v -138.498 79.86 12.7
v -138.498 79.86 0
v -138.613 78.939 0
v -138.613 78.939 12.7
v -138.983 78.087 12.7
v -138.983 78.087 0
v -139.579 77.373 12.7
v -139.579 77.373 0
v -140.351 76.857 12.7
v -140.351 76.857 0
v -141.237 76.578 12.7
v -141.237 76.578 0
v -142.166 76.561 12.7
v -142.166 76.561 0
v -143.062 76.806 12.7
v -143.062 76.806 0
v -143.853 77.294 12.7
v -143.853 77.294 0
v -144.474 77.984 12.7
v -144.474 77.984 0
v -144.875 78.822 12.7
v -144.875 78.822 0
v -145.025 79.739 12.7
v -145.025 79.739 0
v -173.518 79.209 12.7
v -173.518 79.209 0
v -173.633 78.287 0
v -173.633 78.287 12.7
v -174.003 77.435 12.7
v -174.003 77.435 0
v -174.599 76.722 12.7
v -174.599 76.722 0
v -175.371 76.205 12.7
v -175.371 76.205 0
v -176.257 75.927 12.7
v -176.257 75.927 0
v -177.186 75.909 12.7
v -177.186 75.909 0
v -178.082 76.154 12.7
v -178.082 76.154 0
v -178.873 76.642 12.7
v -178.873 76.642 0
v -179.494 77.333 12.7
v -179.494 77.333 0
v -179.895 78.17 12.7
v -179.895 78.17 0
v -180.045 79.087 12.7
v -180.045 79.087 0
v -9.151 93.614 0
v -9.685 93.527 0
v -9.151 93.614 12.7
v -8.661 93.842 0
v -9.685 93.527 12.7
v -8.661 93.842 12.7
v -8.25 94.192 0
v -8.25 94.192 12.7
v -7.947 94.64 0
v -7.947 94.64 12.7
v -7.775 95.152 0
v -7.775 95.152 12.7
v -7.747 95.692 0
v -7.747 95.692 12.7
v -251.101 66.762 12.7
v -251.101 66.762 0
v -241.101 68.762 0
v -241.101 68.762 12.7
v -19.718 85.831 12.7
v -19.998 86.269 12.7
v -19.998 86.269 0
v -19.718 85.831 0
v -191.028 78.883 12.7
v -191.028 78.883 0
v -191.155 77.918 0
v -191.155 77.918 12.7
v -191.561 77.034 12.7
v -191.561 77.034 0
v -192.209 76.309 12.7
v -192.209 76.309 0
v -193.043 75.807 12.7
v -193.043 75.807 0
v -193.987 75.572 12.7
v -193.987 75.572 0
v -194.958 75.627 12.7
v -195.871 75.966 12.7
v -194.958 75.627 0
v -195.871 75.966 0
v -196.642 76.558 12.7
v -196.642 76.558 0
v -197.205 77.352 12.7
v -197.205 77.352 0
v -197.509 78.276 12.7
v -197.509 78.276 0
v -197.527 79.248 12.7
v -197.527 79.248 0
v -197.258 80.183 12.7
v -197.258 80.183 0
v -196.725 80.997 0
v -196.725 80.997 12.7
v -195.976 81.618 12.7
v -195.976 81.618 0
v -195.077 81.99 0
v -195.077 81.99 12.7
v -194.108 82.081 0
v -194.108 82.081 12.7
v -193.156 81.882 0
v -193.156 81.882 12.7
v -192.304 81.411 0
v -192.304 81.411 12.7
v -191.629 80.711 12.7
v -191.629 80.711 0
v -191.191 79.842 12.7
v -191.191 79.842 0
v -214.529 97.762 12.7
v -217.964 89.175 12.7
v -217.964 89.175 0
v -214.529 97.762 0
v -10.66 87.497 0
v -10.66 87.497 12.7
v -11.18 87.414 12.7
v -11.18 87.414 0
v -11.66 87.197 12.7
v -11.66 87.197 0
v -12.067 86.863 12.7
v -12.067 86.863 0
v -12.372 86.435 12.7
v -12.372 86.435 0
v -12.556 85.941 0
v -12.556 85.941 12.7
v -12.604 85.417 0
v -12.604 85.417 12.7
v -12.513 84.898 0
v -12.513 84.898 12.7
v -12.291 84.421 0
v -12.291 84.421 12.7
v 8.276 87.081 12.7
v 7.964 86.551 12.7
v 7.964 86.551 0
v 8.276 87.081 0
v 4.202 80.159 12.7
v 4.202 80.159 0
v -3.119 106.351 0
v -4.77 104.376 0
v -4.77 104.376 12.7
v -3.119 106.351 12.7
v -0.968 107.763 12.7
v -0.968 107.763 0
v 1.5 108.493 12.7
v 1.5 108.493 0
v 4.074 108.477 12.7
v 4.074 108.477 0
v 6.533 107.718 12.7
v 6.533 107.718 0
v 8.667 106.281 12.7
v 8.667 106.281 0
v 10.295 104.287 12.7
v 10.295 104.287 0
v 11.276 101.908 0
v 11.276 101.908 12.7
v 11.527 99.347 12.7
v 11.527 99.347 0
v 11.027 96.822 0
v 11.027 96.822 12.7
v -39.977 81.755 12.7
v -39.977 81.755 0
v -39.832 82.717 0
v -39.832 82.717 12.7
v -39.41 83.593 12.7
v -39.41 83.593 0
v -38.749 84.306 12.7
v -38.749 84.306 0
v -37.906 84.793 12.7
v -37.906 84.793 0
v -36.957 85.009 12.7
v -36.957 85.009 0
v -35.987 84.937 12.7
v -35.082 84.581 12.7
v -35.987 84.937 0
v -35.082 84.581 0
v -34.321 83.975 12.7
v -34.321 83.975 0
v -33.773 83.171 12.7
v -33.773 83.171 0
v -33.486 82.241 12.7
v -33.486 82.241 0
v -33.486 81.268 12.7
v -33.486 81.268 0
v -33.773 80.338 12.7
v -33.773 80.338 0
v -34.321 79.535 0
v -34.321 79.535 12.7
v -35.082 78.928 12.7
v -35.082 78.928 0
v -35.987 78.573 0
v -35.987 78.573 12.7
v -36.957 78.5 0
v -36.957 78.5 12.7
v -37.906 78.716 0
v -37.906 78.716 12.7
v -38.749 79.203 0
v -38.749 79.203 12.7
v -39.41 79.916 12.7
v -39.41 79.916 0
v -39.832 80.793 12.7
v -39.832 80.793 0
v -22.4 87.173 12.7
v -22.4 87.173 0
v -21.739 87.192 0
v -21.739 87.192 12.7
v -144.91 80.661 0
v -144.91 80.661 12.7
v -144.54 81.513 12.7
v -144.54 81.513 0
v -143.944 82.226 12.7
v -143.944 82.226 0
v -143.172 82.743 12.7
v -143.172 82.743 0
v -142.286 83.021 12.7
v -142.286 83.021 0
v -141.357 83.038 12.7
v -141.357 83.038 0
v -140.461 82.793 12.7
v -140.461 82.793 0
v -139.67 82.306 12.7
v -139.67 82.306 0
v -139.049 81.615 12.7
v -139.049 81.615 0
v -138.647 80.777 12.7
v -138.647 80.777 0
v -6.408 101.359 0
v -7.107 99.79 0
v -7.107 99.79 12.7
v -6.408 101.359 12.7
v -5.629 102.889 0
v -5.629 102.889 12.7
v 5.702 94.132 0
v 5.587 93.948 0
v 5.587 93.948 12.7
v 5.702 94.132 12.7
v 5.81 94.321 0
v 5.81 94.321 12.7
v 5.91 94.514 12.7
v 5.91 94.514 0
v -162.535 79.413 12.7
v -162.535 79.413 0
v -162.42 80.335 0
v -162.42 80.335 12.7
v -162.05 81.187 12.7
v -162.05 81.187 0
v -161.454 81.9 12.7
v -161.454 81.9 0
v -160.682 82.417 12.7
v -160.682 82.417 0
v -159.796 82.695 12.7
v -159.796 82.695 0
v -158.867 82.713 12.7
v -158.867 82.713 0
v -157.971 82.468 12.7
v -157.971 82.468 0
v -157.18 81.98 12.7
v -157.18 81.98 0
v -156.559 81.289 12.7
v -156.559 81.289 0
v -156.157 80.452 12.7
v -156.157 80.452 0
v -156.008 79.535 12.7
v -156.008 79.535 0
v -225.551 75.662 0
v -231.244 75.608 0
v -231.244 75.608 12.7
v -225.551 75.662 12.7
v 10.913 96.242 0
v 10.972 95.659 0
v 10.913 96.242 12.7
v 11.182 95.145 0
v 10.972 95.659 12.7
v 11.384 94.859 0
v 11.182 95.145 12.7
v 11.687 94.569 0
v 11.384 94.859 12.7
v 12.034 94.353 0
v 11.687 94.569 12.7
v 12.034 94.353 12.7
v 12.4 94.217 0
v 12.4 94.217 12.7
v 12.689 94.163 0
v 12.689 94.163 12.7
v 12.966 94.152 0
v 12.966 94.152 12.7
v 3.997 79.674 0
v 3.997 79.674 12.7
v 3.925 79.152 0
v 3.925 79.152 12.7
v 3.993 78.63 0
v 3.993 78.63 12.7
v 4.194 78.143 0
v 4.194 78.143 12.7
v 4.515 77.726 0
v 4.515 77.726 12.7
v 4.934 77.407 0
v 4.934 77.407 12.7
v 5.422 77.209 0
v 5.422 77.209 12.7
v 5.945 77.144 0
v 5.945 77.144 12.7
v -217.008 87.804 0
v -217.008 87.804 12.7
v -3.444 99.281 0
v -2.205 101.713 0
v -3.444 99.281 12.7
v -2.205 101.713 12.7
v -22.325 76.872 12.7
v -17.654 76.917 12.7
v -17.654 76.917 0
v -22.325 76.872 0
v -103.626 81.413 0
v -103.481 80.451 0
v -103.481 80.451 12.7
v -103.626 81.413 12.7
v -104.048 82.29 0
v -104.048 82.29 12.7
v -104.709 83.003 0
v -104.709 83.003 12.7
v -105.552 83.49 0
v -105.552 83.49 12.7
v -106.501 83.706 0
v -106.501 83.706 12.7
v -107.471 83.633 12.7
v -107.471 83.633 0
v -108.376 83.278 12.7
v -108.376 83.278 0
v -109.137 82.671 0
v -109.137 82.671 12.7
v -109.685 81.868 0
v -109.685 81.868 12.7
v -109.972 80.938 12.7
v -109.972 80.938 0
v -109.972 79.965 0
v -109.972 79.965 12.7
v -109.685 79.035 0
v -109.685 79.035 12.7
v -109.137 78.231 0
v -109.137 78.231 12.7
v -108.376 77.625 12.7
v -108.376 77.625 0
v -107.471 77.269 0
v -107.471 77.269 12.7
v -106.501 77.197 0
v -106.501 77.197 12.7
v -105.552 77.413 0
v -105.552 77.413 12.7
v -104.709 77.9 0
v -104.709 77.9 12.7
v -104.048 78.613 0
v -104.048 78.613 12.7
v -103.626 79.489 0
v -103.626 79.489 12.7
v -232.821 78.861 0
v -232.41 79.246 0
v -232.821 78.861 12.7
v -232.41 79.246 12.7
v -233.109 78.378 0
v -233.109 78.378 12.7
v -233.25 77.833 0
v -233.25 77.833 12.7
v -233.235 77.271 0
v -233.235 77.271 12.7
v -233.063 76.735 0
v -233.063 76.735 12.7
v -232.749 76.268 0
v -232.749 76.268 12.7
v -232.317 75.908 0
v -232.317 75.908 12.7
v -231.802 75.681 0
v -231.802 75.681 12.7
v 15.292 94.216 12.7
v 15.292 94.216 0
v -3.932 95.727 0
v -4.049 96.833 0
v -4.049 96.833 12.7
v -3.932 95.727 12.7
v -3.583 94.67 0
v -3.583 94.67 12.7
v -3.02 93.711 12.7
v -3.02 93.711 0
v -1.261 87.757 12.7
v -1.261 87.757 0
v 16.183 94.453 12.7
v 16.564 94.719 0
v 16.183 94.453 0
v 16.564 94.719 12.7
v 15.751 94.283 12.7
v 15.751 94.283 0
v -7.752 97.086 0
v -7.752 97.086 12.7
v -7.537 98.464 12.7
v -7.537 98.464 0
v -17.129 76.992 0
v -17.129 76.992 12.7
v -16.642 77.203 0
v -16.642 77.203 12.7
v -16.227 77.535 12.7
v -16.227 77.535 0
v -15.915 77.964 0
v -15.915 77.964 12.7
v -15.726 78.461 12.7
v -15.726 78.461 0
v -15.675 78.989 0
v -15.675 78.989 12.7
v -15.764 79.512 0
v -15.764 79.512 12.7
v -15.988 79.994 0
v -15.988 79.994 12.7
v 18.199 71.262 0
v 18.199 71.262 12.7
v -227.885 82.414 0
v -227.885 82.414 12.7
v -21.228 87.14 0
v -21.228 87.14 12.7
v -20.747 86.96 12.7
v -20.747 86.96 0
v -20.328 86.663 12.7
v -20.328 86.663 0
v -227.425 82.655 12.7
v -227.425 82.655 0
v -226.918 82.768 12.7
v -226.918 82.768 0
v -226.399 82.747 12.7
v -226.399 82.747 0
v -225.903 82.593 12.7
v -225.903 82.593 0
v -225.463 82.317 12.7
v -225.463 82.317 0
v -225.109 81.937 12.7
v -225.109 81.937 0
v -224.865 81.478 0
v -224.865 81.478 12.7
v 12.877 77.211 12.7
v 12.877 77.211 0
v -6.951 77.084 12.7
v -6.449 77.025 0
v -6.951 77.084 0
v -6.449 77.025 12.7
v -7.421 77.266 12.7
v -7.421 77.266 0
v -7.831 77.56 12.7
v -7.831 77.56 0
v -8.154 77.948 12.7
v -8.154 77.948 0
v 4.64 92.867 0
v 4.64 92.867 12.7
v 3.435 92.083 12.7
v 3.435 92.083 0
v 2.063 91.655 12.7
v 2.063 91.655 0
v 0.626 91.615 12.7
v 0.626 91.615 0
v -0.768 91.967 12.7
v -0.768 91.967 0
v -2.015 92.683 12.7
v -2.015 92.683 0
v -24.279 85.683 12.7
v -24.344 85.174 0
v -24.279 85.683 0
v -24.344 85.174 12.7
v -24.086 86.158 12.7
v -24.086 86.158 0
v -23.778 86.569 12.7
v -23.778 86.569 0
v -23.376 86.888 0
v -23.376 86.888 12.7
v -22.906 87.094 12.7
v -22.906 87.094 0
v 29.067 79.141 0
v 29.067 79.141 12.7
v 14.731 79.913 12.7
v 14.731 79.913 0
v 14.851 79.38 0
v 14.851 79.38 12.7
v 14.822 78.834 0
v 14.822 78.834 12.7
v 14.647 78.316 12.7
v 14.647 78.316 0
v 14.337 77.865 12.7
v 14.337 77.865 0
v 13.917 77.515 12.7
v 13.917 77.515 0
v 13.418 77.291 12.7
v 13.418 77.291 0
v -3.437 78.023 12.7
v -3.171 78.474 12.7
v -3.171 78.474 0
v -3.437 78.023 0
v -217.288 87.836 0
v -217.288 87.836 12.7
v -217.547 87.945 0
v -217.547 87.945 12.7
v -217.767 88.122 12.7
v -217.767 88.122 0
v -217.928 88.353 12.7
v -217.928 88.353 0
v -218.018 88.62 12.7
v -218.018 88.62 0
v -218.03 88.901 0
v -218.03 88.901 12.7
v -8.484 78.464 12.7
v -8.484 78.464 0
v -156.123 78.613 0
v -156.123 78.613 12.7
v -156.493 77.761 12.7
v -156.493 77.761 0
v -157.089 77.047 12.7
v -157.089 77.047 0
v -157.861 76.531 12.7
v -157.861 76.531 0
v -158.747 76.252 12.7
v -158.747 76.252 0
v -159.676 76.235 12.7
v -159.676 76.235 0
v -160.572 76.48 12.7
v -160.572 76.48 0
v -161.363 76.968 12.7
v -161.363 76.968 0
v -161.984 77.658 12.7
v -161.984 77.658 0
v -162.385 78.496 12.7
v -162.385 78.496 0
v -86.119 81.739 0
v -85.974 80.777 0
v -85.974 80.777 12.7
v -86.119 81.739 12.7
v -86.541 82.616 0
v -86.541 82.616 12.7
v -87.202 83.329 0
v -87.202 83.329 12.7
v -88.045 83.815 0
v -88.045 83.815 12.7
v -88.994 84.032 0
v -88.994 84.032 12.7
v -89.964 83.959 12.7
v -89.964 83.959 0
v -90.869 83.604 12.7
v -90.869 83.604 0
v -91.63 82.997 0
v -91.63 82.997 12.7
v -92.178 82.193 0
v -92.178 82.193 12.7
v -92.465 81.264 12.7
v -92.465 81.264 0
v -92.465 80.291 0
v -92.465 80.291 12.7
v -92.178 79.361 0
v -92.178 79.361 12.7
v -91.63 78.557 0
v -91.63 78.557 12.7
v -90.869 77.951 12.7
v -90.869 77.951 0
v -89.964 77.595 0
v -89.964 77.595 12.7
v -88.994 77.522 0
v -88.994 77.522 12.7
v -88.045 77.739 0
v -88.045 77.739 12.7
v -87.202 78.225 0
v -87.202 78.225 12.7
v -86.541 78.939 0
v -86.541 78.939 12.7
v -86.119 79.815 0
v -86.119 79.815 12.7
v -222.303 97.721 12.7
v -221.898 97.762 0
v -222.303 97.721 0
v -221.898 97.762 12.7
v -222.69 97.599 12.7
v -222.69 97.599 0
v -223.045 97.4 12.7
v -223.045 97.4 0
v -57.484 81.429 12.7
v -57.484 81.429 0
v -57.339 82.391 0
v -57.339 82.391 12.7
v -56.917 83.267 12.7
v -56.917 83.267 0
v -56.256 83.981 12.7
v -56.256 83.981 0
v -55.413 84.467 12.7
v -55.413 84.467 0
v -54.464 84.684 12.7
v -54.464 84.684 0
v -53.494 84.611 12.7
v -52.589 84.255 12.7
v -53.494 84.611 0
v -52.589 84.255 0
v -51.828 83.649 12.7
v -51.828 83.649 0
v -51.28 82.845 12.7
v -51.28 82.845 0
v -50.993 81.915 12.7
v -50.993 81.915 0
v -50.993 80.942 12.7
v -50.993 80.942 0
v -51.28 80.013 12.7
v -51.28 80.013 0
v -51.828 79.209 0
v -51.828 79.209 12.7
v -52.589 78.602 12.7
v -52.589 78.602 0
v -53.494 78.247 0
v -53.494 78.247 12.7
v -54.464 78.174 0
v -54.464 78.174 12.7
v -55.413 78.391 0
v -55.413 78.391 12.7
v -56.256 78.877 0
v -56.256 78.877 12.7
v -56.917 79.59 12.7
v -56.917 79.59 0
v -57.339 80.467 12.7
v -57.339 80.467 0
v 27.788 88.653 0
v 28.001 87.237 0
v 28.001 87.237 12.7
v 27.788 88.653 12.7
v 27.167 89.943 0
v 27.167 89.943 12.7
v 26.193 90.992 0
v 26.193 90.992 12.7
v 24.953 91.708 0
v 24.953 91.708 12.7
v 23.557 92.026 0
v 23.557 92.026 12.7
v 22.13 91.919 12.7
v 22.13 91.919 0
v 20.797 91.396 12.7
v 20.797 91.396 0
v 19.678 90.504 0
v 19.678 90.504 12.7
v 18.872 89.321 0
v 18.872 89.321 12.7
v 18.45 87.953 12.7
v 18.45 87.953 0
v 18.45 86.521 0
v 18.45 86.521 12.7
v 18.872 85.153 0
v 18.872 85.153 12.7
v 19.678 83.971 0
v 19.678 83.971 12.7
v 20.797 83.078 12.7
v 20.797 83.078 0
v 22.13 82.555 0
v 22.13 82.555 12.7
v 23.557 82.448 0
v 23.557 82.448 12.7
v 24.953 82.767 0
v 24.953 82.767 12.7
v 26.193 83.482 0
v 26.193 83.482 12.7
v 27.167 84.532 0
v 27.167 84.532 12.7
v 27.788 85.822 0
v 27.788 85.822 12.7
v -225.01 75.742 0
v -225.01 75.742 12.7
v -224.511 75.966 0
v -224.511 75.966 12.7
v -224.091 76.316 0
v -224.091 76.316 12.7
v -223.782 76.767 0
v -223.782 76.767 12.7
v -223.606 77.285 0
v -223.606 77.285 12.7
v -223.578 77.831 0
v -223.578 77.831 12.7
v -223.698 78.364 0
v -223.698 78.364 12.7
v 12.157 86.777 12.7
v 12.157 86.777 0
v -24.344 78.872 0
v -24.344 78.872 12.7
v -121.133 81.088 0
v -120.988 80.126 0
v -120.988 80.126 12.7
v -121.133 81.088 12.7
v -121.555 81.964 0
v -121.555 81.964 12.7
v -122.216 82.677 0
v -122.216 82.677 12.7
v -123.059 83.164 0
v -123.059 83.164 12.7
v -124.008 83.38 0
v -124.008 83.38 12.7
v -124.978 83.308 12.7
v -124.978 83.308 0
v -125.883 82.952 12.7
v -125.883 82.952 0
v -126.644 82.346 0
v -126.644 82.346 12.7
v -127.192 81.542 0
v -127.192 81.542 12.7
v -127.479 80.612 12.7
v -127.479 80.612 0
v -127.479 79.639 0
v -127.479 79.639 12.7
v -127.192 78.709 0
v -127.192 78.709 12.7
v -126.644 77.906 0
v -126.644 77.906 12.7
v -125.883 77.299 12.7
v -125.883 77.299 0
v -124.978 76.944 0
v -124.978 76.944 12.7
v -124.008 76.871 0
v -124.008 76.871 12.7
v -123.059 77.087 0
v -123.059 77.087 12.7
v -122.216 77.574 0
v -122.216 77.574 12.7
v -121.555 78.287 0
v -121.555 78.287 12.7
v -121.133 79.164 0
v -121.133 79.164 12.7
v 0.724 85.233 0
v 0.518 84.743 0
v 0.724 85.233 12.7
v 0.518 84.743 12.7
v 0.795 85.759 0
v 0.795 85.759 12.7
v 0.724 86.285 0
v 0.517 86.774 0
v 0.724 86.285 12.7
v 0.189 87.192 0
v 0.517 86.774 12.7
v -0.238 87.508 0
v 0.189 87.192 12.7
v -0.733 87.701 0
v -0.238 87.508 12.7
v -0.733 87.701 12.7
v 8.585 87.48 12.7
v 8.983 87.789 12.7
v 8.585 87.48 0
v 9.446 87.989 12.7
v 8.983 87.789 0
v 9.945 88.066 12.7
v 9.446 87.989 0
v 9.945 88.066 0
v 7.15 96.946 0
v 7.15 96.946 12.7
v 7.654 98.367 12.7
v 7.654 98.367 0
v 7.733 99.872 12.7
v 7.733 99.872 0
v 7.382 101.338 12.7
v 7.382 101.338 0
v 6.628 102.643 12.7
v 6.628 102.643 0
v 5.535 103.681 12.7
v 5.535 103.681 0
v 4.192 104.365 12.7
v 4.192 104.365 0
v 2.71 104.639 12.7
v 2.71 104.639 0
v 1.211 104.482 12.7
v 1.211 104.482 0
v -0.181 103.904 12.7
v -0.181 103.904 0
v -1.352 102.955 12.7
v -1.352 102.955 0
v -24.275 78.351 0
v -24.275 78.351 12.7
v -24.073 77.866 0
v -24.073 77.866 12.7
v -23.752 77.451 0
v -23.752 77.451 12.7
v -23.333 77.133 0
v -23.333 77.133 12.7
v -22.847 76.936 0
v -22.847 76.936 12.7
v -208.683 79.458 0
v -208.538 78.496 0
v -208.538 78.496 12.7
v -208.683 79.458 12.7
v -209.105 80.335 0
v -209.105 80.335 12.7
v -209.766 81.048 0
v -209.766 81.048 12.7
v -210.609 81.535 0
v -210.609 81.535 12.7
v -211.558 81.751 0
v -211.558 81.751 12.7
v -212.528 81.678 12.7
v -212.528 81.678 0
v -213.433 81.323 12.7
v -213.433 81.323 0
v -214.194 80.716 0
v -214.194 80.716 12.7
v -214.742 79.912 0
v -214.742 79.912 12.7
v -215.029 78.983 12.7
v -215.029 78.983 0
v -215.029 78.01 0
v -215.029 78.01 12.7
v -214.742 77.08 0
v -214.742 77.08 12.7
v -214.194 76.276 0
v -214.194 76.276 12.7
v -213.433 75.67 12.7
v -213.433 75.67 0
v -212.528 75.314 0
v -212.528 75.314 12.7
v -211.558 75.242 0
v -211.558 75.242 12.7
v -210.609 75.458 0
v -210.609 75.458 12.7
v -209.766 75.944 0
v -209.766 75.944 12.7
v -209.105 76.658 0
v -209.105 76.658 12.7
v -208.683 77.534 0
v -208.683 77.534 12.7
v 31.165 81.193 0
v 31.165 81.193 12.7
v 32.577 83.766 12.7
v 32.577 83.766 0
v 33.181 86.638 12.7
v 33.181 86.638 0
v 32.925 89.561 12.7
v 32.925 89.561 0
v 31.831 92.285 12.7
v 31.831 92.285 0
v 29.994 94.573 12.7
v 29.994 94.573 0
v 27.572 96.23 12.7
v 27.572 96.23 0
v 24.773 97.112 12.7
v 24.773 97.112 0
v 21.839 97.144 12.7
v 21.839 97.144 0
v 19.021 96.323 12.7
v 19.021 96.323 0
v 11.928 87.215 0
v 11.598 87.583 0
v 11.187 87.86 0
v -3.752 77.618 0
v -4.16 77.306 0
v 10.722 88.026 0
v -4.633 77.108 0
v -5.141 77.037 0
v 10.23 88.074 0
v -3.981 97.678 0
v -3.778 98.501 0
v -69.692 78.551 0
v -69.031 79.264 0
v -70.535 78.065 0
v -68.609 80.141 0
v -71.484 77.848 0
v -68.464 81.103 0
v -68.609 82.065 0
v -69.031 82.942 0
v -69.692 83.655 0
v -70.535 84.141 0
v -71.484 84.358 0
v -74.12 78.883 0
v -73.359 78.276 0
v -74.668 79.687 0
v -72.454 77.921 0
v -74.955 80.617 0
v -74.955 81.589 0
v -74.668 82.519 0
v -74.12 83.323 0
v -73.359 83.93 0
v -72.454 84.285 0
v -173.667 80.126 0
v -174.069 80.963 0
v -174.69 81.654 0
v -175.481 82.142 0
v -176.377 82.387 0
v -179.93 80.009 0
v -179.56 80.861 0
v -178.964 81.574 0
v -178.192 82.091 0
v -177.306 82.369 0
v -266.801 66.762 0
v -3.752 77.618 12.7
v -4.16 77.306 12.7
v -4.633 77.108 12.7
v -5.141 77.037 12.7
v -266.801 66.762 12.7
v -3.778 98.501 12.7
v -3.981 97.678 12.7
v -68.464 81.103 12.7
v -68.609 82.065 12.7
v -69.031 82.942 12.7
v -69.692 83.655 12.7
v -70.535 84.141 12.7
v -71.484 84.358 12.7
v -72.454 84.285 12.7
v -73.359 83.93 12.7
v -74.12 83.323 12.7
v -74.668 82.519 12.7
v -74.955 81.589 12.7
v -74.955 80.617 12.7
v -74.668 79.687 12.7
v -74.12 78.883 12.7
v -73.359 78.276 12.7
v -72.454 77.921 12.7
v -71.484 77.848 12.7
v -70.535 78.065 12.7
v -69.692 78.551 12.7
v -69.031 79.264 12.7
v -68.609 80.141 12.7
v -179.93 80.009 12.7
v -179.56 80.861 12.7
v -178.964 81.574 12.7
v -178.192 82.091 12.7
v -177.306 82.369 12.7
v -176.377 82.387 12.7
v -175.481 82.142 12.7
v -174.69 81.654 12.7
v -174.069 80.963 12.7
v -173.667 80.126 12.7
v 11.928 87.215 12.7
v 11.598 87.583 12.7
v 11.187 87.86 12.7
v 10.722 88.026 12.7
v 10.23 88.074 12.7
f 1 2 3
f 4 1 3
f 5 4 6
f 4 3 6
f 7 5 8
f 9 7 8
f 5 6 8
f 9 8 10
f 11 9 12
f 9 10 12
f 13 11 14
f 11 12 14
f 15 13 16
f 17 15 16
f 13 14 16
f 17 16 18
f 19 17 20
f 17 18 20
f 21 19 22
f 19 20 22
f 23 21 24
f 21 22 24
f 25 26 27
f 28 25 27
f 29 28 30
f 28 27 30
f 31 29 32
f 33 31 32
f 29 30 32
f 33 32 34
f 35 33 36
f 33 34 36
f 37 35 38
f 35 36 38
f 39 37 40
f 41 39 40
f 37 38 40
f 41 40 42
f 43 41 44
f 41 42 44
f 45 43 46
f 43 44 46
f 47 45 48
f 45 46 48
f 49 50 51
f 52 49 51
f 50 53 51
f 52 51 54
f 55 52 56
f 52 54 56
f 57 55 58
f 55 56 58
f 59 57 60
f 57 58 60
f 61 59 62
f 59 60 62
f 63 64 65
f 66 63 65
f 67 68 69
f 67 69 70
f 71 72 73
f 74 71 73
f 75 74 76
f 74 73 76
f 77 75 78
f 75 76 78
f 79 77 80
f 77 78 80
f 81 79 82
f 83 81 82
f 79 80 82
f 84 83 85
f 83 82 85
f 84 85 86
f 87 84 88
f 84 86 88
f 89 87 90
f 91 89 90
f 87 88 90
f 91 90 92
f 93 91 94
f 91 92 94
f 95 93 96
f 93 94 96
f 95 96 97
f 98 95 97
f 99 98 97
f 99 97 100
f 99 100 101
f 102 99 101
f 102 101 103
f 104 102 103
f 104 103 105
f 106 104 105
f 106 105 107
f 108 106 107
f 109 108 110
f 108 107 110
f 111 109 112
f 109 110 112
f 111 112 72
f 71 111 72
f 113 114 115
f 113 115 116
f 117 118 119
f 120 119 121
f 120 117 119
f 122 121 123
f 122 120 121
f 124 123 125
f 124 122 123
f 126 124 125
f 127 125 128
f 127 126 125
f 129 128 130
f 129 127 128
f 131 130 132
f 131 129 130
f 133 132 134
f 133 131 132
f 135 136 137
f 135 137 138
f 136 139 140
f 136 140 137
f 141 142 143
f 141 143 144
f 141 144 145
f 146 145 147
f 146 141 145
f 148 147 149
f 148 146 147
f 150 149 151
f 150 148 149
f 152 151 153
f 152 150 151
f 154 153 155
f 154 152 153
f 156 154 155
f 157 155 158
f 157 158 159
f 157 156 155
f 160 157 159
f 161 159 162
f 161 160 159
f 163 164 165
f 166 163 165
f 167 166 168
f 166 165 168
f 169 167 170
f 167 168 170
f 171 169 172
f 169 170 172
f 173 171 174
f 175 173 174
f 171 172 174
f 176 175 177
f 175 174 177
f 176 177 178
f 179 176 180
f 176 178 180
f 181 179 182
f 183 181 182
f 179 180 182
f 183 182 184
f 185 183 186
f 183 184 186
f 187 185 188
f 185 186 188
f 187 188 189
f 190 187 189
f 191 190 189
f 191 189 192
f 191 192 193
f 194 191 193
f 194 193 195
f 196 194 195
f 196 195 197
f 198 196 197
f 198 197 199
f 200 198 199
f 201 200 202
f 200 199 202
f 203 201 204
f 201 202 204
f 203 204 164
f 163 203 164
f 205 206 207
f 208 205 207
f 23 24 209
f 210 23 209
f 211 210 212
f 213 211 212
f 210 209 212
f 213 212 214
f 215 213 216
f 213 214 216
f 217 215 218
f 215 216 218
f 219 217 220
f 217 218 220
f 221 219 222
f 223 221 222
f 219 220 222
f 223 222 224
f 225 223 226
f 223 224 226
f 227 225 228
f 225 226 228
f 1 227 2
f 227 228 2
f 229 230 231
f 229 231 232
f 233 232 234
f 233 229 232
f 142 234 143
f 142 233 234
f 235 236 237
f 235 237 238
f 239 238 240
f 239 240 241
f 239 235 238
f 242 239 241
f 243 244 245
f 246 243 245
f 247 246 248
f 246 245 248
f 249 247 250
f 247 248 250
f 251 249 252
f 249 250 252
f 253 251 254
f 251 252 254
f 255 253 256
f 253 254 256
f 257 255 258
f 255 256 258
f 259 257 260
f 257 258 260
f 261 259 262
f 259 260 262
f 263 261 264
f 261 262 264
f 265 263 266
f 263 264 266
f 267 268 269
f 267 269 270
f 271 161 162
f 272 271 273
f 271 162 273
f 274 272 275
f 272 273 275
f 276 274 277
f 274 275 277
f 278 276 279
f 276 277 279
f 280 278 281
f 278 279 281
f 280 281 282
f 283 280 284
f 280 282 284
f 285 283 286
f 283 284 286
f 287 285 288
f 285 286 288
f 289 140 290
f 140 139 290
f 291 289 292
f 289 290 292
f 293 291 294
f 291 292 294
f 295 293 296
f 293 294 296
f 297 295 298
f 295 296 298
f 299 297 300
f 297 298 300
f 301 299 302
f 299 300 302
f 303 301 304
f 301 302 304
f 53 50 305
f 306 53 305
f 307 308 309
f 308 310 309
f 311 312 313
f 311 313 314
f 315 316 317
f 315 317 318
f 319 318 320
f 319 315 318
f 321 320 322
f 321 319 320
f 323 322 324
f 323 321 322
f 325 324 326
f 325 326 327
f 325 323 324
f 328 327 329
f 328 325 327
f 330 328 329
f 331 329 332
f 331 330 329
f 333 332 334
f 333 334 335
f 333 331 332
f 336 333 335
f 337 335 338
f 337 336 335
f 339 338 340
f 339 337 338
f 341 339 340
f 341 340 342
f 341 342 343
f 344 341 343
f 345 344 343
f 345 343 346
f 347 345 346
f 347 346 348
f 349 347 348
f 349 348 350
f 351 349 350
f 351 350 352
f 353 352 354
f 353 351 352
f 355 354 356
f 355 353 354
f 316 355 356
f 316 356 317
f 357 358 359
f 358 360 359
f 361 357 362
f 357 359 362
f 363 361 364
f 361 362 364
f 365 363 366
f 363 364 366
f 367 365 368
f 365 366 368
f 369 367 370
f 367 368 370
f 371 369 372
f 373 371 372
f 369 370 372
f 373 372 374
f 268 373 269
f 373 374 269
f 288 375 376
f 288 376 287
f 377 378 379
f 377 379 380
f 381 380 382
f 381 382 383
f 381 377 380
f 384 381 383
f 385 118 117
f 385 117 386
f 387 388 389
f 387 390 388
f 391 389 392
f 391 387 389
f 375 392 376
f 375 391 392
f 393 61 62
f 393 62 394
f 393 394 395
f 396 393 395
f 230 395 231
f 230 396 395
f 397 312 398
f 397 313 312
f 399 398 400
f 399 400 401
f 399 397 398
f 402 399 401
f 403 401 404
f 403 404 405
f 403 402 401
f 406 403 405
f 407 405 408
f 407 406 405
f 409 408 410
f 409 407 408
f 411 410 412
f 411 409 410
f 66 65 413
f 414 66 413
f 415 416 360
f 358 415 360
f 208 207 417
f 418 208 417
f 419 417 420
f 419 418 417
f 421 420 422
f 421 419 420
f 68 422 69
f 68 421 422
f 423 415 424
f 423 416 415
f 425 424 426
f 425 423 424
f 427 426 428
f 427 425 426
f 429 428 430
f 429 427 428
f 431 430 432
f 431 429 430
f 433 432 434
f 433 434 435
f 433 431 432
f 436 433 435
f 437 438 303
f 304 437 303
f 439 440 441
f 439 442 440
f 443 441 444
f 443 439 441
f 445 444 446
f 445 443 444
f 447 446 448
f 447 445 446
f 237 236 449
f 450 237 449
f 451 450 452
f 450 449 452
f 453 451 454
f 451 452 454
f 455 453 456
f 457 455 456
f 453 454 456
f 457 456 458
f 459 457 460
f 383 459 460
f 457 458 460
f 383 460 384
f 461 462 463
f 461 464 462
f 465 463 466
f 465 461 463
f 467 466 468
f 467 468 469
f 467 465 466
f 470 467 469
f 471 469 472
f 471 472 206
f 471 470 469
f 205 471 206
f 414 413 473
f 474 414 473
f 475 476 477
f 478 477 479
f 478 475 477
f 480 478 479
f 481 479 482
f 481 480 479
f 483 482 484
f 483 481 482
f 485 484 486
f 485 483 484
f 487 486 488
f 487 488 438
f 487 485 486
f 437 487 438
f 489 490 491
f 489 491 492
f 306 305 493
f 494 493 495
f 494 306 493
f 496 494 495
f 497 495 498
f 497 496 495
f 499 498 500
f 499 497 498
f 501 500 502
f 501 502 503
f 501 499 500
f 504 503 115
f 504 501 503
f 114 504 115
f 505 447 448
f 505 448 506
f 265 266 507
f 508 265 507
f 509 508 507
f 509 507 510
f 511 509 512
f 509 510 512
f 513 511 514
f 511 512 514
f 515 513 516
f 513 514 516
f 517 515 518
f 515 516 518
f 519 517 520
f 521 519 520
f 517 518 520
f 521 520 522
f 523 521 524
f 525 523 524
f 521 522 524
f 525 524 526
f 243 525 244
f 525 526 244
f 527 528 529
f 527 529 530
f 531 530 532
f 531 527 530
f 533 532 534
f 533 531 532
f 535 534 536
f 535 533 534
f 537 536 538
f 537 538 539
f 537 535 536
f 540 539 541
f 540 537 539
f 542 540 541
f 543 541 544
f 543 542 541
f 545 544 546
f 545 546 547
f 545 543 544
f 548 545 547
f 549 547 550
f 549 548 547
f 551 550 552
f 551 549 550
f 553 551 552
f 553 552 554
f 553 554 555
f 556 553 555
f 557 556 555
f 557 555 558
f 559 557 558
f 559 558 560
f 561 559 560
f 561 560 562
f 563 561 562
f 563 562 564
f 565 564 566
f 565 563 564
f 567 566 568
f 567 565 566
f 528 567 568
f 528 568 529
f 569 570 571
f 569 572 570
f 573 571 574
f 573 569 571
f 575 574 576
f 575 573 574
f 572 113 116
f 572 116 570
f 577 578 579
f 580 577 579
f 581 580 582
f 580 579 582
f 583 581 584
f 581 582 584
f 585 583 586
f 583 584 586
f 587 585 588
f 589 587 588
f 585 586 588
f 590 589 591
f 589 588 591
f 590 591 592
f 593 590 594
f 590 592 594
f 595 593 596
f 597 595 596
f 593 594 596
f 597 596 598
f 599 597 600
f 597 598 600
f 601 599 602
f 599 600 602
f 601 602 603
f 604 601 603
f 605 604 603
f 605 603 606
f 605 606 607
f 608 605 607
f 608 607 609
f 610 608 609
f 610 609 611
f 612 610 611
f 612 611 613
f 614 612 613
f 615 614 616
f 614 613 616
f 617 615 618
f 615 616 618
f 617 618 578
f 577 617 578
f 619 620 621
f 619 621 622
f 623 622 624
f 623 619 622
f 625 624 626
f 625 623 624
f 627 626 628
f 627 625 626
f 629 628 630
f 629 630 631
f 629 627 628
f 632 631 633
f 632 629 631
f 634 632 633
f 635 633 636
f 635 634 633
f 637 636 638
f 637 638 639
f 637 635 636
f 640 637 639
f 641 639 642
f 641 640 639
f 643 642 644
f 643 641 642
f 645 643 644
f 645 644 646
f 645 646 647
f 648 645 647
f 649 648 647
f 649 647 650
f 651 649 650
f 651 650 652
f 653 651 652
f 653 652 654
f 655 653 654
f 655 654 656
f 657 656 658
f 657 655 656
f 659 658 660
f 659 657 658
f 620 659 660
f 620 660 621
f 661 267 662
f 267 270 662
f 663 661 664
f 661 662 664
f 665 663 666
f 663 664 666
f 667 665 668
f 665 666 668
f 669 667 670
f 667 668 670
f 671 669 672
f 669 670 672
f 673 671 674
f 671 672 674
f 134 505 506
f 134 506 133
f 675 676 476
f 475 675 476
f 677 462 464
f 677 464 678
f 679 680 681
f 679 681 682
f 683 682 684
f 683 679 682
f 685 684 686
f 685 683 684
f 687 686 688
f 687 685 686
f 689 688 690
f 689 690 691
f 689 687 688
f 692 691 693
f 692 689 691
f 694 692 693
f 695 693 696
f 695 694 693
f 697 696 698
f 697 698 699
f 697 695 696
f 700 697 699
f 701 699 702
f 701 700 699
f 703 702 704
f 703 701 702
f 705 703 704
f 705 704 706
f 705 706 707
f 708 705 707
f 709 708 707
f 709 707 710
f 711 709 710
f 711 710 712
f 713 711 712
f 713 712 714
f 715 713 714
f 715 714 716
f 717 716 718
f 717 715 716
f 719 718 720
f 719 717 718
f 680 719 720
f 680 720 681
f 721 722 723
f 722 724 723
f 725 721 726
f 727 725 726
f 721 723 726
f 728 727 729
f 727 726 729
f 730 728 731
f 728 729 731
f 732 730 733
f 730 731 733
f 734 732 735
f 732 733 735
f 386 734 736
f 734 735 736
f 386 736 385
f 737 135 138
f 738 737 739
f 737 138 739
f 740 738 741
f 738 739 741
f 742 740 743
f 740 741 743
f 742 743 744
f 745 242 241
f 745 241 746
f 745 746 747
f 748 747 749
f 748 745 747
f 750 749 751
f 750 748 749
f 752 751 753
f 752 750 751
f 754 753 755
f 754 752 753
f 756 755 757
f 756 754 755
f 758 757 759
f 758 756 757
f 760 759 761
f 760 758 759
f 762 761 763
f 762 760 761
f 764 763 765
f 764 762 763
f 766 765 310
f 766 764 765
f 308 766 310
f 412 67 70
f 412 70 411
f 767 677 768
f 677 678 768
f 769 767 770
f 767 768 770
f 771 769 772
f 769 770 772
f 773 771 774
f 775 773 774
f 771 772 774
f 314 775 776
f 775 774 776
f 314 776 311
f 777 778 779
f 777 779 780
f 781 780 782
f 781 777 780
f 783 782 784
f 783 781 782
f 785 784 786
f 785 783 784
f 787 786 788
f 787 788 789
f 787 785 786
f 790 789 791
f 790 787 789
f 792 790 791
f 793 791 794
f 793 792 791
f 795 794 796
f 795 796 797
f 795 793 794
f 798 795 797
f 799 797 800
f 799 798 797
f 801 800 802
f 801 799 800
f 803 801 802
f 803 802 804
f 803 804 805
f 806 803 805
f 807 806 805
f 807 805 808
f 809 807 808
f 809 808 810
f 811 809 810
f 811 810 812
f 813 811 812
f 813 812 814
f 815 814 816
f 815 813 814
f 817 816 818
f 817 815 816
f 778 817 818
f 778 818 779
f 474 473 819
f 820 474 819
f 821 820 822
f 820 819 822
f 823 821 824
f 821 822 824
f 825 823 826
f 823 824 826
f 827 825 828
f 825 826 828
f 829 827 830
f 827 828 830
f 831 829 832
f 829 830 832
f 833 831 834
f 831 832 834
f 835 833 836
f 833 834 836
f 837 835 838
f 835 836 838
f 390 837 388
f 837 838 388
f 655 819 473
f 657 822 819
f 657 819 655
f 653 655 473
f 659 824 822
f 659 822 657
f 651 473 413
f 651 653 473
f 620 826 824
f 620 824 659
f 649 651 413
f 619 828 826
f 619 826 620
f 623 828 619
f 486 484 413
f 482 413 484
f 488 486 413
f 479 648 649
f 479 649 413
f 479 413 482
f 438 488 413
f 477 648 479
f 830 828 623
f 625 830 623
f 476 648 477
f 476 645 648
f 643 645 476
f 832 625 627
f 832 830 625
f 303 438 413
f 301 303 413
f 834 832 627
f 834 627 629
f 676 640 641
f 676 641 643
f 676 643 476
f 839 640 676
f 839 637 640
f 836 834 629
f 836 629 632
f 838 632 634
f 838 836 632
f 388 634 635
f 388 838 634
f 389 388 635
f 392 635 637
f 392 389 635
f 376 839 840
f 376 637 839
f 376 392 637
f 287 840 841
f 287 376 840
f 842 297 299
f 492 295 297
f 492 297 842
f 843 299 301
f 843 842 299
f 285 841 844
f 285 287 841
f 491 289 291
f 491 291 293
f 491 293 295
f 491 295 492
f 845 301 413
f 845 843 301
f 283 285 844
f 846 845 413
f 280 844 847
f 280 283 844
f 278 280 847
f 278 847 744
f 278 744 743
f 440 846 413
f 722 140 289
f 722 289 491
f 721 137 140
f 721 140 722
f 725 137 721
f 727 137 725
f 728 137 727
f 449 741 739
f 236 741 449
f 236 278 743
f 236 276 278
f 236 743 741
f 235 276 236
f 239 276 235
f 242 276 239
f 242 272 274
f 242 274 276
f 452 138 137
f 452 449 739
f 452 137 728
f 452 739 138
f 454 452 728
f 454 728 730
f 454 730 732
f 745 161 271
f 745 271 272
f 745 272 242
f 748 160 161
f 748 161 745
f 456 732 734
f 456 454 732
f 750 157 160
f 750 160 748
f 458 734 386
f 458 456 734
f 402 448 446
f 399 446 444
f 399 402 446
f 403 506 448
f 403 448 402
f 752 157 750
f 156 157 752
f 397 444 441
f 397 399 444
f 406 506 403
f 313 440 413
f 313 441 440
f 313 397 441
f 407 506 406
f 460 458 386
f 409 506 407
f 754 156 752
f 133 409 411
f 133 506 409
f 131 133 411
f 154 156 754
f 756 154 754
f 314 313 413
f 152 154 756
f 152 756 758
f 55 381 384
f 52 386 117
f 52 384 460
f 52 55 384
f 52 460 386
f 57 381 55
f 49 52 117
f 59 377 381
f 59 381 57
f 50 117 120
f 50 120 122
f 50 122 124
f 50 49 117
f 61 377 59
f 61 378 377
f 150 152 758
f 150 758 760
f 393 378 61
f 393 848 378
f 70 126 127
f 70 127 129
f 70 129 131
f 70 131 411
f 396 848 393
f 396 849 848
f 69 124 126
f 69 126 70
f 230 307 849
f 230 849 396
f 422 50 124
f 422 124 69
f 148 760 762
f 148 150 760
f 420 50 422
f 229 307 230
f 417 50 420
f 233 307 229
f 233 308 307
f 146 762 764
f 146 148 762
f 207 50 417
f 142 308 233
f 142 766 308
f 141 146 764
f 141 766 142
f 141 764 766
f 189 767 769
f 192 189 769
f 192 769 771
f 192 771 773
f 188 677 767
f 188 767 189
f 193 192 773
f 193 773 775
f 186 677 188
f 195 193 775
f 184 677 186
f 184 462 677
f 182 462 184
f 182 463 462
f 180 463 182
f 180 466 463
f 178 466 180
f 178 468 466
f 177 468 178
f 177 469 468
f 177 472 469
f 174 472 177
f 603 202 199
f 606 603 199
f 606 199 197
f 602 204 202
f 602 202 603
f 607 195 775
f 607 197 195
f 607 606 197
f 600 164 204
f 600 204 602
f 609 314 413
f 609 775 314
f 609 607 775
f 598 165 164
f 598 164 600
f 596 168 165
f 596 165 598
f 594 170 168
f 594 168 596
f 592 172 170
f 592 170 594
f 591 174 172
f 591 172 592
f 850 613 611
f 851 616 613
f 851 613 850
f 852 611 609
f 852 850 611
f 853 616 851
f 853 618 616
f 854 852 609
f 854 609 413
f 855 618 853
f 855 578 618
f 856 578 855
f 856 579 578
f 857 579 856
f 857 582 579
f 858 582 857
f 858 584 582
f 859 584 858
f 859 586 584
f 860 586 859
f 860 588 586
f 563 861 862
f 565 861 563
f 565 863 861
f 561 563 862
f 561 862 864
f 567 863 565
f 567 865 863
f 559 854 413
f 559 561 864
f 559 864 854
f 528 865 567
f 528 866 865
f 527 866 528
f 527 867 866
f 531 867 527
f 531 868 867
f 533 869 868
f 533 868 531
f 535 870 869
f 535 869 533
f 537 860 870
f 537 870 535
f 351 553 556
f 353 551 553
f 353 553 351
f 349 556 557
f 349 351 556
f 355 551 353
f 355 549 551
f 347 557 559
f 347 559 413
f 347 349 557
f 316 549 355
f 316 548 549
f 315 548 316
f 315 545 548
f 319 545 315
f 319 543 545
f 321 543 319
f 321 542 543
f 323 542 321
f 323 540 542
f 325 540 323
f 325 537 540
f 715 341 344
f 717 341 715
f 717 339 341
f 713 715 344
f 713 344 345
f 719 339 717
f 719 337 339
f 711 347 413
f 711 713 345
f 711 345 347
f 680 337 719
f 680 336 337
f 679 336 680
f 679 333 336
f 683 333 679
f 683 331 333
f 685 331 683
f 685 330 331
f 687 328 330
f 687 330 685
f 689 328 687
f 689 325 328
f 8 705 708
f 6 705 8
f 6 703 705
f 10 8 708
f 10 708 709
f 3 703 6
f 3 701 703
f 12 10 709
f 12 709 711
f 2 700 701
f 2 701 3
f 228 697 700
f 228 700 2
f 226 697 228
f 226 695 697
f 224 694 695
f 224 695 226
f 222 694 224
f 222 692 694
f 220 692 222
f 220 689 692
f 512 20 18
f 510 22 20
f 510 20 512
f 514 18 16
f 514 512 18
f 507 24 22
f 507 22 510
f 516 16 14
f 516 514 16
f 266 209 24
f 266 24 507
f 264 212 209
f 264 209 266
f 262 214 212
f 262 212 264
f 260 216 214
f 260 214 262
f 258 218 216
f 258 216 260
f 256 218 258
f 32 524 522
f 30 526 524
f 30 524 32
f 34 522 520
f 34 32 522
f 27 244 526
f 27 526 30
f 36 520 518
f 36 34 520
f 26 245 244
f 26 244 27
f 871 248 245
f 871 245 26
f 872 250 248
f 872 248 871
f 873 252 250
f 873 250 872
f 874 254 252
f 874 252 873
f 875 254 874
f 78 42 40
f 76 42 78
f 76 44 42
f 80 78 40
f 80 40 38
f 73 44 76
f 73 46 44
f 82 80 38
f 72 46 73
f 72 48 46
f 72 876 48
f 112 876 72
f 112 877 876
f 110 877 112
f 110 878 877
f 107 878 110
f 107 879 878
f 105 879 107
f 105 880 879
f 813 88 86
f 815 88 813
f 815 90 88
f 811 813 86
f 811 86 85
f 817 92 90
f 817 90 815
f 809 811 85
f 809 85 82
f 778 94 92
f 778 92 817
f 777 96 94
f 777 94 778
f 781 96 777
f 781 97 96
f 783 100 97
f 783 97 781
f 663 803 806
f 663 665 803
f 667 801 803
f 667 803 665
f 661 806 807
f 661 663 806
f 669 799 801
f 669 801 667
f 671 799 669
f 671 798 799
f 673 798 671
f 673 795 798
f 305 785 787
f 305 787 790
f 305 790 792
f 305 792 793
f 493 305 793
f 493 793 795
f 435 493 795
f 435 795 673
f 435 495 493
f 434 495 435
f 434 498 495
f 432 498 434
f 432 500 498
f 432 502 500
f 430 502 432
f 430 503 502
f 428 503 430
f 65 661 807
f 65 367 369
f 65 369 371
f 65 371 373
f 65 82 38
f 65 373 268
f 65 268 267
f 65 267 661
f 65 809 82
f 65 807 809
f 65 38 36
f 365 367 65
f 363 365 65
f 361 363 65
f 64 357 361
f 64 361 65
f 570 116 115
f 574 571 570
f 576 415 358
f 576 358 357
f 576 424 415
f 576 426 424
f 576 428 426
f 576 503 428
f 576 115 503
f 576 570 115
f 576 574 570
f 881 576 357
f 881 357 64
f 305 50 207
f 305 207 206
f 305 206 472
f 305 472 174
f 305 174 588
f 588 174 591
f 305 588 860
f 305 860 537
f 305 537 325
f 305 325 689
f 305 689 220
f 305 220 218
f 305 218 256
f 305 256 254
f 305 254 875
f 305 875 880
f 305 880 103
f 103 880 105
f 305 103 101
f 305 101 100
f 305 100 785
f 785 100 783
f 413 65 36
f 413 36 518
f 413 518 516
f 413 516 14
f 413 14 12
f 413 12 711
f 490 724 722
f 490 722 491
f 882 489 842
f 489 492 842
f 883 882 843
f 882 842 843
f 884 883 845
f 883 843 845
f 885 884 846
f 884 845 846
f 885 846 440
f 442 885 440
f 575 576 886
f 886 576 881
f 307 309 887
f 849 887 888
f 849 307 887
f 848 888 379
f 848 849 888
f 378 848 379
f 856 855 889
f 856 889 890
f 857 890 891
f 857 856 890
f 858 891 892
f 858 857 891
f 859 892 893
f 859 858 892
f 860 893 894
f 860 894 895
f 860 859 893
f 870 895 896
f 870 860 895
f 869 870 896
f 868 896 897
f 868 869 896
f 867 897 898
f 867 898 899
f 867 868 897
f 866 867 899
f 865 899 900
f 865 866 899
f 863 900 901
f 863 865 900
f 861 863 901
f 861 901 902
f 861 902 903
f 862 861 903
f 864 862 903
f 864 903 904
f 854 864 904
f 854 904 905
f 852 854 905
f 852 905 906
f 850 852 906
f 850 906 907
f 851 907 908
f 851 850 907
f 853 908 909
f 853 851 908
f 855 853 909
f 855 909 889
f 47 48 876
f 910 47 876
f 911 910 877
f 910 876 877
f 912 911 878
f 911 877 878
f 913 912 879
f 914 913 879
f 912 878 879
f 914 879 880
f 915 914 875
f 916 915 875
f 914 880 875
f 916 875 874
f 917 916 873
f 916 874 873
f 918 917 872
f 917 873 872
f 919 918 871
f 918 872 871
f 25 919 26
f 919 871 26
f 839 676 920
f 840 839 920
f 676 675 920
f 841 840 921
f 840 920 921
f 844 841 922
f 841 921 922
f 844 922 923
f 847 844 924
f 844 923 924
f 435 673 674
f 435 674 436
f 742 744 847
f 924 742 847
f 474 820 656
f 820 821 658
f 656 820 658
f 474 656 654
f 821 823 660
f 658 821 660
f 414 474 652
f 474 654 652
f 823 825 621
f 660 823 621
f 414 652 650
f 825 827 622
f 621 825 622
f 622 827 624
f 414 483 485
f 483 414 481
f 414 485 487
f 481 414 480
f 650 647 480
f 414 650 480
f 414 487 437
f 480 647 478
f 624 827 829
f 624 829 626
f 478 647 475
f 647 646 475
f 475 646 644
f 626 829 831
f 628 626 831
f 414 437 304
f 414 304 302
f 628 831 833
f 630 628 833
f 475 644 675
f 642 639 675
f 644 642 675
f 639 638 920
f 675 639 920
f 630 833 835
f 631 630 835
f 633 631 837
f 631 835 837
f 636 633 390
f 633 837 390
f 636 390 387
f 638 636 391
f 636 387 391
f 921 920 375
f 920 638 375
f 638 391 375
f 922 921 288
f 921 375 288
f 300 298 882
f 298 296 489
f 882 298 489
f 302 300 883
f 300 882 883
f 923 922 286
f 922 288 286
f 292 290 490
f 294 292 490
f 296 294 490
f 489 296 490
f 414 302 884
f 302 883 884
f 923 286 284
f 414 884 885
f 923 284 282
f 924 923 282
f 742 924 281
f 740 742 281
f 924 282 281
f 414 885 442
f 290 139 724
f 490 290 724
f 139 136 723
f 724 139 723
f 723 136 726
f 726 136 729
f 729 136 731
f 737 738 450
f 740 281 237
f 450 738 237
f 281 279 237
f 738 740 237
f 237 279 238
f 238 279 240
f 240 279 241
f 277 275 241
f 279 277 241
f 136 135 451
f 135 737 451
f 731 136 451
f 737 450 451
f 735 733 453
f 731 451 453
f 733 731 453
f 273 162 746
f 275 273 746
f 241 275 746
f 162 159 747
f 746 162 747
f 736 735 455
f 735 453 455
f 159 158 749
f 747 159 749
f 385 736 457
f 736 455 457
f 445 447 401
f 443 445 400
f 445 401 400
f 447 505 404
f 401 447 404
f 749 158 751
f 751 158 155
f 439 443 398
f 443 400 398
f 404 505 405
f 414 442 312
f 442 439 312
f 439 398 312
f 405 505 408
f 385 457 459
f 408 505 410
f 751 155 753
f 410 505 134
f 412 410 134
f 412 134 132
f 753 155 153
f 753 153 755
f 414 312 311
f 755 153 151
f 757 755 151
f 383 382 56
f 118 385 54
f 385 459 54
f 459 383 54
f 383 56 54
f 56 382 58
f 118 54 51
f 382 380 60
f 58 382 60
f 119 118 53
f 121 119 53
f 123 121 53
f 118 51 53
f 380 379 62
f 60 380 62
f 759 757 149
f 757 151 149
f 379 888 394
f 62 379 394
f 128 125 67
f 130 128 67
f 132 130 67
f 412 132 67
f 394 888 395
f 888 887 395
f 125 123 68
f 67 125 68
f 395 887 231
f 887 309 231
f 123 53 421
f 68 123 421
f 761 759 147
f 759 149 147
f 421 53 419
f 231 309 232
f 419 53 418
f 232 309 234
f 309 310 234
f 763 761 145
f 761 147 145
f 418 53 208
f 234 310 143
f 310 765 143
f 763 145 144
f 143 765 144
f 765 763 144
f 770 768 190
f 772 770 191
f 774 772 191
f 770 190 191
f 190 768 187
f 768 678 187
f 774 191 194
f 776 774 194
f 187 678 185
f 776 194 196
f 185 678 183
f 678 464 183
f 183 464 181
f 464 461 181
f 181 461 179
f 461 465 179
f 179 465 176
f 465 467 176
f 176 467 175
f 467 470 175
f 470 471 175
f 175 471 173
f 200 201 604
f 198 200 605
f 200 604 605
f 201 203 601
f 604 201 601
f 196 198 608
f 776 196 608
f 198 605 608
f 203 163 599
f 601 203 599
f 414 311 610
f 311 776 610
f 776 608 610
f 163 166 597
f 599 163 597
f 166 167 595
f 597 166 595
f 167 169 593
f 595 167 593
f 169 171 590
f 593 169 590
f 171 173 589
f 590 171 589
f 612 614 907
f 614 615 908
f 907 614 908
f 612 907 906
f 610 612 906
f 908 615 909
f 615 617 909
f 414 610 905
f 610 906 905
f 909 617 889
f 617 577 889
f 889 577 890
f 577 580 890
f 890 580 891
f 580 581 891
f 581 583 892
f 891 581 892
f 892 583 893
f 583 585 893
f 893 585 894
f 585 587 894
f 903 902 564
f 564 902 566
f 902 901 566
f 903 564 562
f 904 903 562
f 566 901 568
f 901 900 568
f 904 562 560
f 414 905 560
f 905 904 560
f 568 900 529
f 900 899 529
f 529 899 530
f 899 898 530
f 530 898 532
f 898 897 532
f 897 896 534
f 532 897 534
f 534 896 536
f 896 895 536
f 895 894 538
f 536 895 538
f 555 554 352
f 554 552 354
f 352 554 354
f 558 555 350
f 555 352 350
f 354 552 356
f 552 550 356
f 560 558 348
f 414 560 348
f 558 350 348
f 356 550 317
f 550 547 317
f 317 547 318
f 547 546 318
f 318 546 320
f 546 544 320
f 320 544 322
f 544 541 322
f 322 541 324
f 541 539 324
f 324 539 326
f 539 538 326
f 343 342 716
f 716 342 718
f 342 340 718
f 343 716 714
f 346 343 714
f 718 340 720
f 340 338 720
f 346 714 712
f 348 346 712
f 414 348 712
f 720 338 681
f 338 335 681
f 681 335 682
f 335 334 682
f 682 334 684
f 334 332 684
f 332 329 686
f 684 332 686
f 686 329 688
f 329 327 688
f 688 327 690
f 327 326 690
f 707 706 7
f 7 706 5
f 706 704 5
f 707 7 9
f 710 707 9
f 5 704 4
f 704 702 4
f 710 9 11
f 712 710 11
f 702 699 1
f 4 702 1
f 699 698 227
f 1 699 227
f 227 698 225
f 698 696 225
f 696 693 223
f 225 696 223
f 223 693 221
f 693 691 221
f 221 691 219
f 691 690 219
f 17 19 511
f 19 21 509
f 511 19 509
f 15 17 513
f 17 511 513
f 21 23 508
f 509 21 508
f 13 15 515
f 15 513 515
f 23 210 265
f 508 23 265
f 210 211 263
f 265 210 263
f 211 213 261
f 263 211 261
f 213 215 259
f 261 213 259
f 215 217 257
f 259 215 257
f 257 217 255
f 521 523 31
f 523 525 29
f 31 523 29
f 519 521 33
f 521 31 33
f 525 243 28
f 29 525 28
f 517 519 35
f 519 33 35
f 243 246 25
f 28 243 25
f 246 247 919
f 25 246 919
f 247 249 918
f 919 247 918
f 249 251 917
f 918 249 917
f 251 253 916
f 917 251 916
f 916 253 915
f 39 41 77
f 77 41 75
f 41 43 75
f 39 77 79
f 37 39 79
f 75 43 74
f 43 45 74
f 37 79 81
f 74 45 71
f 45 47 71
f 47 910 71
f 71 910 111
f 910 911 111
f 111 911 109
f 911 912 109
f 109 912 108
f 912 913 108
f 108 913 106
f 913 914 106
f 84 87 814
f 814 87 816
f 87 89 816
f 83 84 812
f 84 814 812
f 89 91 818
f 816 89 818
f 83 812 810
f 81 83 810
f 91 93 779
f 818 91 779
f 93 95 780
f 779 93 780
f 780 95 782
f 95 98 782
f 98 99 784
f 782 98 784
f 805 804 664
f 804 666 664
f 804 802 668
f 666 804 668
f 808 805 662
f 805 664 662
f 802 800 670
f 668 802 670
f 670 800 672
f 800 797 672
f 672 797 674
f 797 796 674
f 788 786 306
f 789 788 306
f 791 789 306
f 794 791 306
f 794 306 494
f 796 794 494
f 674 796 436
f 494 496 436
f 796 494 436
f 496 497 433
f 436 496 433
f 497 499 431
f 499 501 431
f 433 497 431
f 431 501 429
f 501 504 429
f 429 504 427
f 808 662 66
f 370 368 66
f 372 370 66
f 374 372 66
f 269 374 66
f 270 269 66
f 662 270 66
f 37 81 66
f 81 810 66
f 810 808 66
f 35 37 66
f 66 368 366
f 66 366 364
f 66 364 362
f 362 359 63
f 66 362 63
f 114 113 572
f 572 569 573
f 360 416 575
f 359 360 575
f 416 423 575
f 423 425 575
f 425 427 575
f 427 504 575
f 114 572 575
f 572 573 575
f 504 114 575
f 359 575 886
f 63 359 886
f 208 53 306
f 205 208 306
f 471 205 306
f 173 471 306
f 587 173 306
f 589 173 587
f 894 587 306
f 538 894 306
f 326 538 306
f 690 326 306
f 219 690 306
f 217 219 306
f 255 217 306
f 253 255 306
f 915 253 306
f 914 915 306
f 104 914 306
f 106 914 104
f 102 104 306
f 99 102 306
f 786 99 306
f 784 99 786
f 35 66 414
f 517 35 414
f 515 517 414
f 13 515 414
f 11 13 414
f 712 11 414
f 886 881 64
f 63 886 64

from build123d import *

# Parameters (mm, degrees)
SKETCH1_R           = 3.2639
SKETCH1_R_2         = 4.8025
BOSS_EXTRUDE1_DEPTH = 12.7
EXTRUDE_THIN1_DEPTH = 12.7
FILLET6_R           = 2
FILLET3_R           = 1
FILLET4_R           = 2
BOSS_EXTRUDE5_DEPTH = 12.7
CUT_EXTRUDE8_DEPTH  = 12.7
FILLET13_R          = 100
FILLET14_R          = 2
CUT_EXTRUDE9_DEPTH  = 12.7
FILLET16_R          = 2
BOSS_EXTRUDE6_DEPTH = 12.7
SKETCH18_R          = 3.2639
CUT_EXTRUDE10_DEPTH = 12.7
FILLET17_R          = 2


with BuildPart() as part:
    # Sketch1 → Boss-Extrude1 (new body)
    with BuildSketch(Plane.XY):
        with BuildLine():
            Line((-266.801436578, 66.762186411), (-251.101436578, 66.762186411))
            Line((-251.101436578, 66.762186411), (-241.101436578, 68.762186411))
            Line((-241.101436578, 68.762186411), (18.198563422, 71.262186411))
            Line((18.198563422, 71.262186411), (29.067448443, 79.140508783))
            ThreePointArc((29.067448443, 79.140508783), (30.773671377, 93.765412775), (16.057134994, 94.237186411))
            Line((16.057134994, 94.237186411), (-218.528848369, 87.762186411))
            Line((-218.528848369, 87.762186411), (-214.528848369, 97.762186411))
            Line((-214.528848369, 97.762186411), (-222.528848369, 97.762186411))
            Line((-222.528848369, 97.762186411), (-266.801436578, 66.762186411))
        make_face()
        with Locations((-211.801436578, 78.496276476)):
            Circle(SKETCH1_R, mode=Mode.SUBTRACT)
        with BuildLine():
            ThreePointArc((-197.554771535, 78.761405302), (-194.352166872, 82.085470554), (-191.028101621, 78.882865891))
            ThreePointArc((-191.028101621, 78.882865891), (-194.230706283, 75.55880064), (-197.554771535, 78.761405302))
        make_face(mode=Mode.SUBTRACT)
        with BuildLine():
            ThreePointArc((-180.044771535, 79.087264423), (-176.842166872, 82.411329675), (-173.518101621, 79.208725013))
            ThreePointArc((-173.518101621, 79.208725013), (-176.720706283, 75.884659761), (-180.044771535, 79.087264423))
        make_face(mode=Mode.SUBTRACT)
        with BuildLine():
            ThreePointArc((-162.534771535, 79.413123544), (-159.332166872, 82.737188796), (-156.008101621, 79.534584134))
            ThreePointArc((-156.008101621, 79.534584134), (-159.210706283, 76.210518882), (-162.534771535, 79.413123544))
        make_face(mode=Mode.SUBTRACT)
        with BuildLine():
            ThreePointArc((-145.024771535, 79.738982665), (-141.822166872, 83.063047917), (-138.498101621, 79.860443255))
            ThreePointArc((-138.498101621, 79.860443255), (-141.700706283, 76.536378003), (-145.024771535, 79.738982665))
        make_face(mode=Mode.SUBTRACT)
        with Locations((-124.251436578, 80.125572081)):
            Circle(SKETCH1_R, mode=Mode.SUBTRACT)
        with Locations((-106.744467891, 80.45137479)):
            Circle(SKETCH1_R, mode=Mode.SUBTRACT)
        with Locations((-89.237499204, 80.777177499)):
            Circle(SKETCH1_R, mode=Mode.SUBTRACT)
        with Locations((-71.727499204, 81.10303662)):
            Circle(SKETCH1_R, mode=Mode.SUBTRACT)
        with BuildLine():
            ThreePointArc((-56.754762895, 76.539814612), (-61.641816892, 81.290680691), (-56.935012167, 86.220185184))
            Line((-56.935012167, 86.220185184), (11.656299, 88.113430183))
            Line((11.656299, 88.113430183), (15.733532107, 77.238699061))
            Line((15.733532107, 77.238699061), (-56.754762895, 76.539814612))
        make_face(mode=Mode.SUBTRACT)
        with Locations((23.198563422, 87.237186411)):
            Circle(SKETCH1_R_2, mode=Mode.SUBTRACT)
    extrude(amount=BOSS_EXTRUDE1_DEPTH)

    # Sketch3 → Extrude-Thin1 (add)
    with BuildSketch(Plane.XY.offset(12.7)):
        Polygon((4.238515695, 91.06458037), (3.224088624, 89.340939538), (-3.171442721, 78.474116994), (-4.185869793, 76.750476162), (0.554142495, 73.960801716), (1.568569566, 75.684442548), (7.964100911, 86.551265092), (8.978527982, 88.274905924), align=None)
        Polygon((-7.406763076, 76.778305642), (-8.483669151, 78.463616684), (-15.08355213, 88.792145717), (-16.160458205, 90.477456759), (-20.795063569, 87.515965054), (-19.718157494, 85.830654012), (-13.118274515, 75.502124979), (-12.04136844, 73.816813937), align=None)
        Polygon((-55.789995158, 86.920345113), (-54.713089083, 85.235034072), (-48.113206103, 74.906505038), (-47.036300029, 73.221193997), (-42.401694665, 76.182685702), (-43.478600739, 77.867996743), (-50.078483719, 88.196525777), (-51.155389794, 89.881836818), align=None)
        Polygon((-30.756415894, 90.46896043), (-31.770842965, 88.745319598), (-38.16637431, 77.878497054), (-39.180801381, 76.154856222), (-34.440789094, 73.365181776), (-33.426362022, 75.088822608), (-27.030830678, 85.955645152), (-26.016403606, 87.679285984), align=None)
    extrude(amount=-EXTRUDE_THIN1_DEPTH)

    # Fillet6
    fillet6_edges = [part.edges().sort_by_distance(p)[0] for p in [
        (-7.55746183, 77.014142621, 6.35),
        (-14.193924314, 87.399916982, 6.35),
        (-38.852657232, 76.712414937, 6.35),
        (-32.865984778, 86.884534137, 6.35),
        (-32.434398171, 76.774295568, 6.35),
        (-26.378761772, 87.063593296, 6.35),
        (-49.203405679, 76.61261983, 6.35),
        (-55.370195509, 86.263376972, 6.35),
        (-42.716385675, 76.675163409, 6.35),
        (-48.956334512, 86.440411206, 6.35),
        (15.733532107, 77.238699061, 6.35),
        (11.656299, 88.113430183, 6.35),
        (-4.010566108, 77.048339456, 6.35),
        (2.350483264, 87.856572736, 6.35),
        (2.407692953, 77.110220087, 6.35),
        (8.83770627, 88.035631895, 6.35),
    ]]
    fillet(fillet6_edges, radius=FILLET6_R)

    # Fillet3
    fillet3_edges = [part.edges().sort_by_distance(p)[0] for p in [
        (-218.528848369, 87.762186411, 6.35),
    ]]
    fillet(fillet3_edges, radius=FILLET3_R)

    # Fillet4
    fillet4_edges = [part.edges().sort_by_distance(p)[0] for p in [
        (-222.528848369, 97.762186411, 6.35),
    ]]
    fillet(fillet4_edges, radius=FILLET4_R)

    # Sketch15 → Boss-Extrude5 (add)
    with BuildSketch(Plane(origin=(0, 0, 0), x_dir=(-1, 0, 0), z_dir=(0, 0, -1))):
        with BuildLine():
            ThreePointArc((-10.240564525, 95.177858348), (-9.91771052, 94.625214052), (-9.618412164, 94.059465945))
            Line((-9.618412164, 94.059465945), (-5.586658581, 93.948182209))
            ThreePointArc((-5.586658581, 93.948182209), (-6.060393003, 94.847345318), (-6.352002714, 95.820937828))
            ThreePointArc((-6.352002714, 95.820937828), (-4.888389862, 104.071201116), (2.646503395, 100.405905698))
            ThreePointArc((2.646503395, 100.405905698), (3.686135654, 98.752465403), (4.04944042, 96.833426662))
            ThreePointArc((4.04944042, 96.833426662), (3.785365476, 95.18933076), (3.019706577, 93.710630871))
            Line((3.019706577, 93.710630871), (7.309930071, 93.592212896))
            ThreePointArc((7.309930071, 93.592212896), (7.772330748, 96.70964865), (7.106994943, 99.790159701))
            ThreePointArc((7.106994943, 99.790159701), (6.028678087, 102.129209778), (4.770165569, 104.37644558))
            ThreePointArc((4.770165569, 104.37644558), (-7.334493094, 107.282517011), (-10.240564525, 95.177858348))
        make_face()
    extrude(amount=-BOSS_EXTRUDE5_DEPTH)

    # Sketch15<3> → Cut-Extrude8 (cut)
    with BuildSketch(Plane(origin=(0, 0, 0), x_dir=(-1, 0, 0), z_dir=(0, 0, -1))):
        with BuildLine():
            Line((3.019706577, 93.710630871), (-5.586658581, 93.948182209))
            ThreePointArc((-5.586658581, 93.948182209), (-1.345413965, 91.585425404), (3.019706577, 93.710630871))
        make_face()
    extrude(amount=-CUT_EXTRUDE8_DEPTH, mode=Mode.SUBTRACT)

    # Fillet13
    fillet13_edges = [part.edges().sort_by_distance(p)[0] for p in [
        (6.352002714, 95.820937828, 6.35),
        (-2.646503395, 100.405905698, 6.35),
    ]]
    fillet(fillet13_edges, radius=FILLET13_R)

    # Fillet14
    fillet14_edges = [part.edges().sort_by_distance(p)[0] for p in [
        (16.057134994, 94.237186411, 6.35),
        (-7.309930071, 93.592212896, 6.35),
        (9.618412164, 94.059465945, 6.35),
    ]]
    fillet(fillet14_edges, radius=FILLET14_R)

    # Sketch17 → Cut-Extrude9 (cut)
    with BuildSketch(Plane(origin=(0, 0, 0), x_dir=(-1, 0, 0), z_dir=(0, 0, -1))):
        Polygon((225.771163147, 83.894534568), (237.695045428, 75.54534231), (222.695045428, 75.689962442), align=None)
    extrude(amount=-CUT_EXTRUDE9_DEPTH, mode=Mode.SUBTRACT)

    # Fillet16
    fillet16_edges = [part.edges().sort_by_distance(p)[0] for p in [
        (-237.695045428, 75.54534231, 6.35),
        (-225.771163147, 83.894534568, 6.35),
        (-222.695045428, 75.689962442, 6.35),
    ]]
    fillet(fillet16_edges, radius=FILLET16_R)

    # Sketch20 → Boss-Extrude6 (add)
    with BuildSketch(Plane(origin=(0, 0, 0), x_dir=(-1, 0, 0), z_dir=(0, 0, -1))):
        Polygon((24.344481835, 87.119743124), (24.344481835, 76.852293218), (33.994868443, 72.80053303), (65.802348689, 76.852293218), (61.329456715, 89.562181047), align=None)
    extrude(amount=-BOSS_EXTRUDE6_DEPTH)

    # Sketch18 → Cut-Extrude10 (cut)
    with BuildSketch(Plane(origin=(0, 0, 0), x_dir=(-1, 0, 0), z_dir=(0, 0, -1))):
        with Locations((54.220530518, 81.428839328)):
            Circle(SKETCH18_R)
        with Locations((36.713561831, 81.754642037)):
            Circle(SKETCH18_R)
    extrude(amount=-CUT_EXTRUDE10_DEPTH, mode=Mode.SUBTRACT)

    # Fillet17
    fillet17_edges = [part.edges().sort_by_distance(p)[0] for p in [
        (-14.044481835, 76.951599042, 6.35),
        (-20.607785311, 87.222882748, 6.35),
        (-24.344481835, 76.852293218, 6.35),
        (-24.344481835, 87.119743124, 6.35),
    ]]
    fillet(fillet17_edges, radius=FILLET17_R)


solid = part.part
